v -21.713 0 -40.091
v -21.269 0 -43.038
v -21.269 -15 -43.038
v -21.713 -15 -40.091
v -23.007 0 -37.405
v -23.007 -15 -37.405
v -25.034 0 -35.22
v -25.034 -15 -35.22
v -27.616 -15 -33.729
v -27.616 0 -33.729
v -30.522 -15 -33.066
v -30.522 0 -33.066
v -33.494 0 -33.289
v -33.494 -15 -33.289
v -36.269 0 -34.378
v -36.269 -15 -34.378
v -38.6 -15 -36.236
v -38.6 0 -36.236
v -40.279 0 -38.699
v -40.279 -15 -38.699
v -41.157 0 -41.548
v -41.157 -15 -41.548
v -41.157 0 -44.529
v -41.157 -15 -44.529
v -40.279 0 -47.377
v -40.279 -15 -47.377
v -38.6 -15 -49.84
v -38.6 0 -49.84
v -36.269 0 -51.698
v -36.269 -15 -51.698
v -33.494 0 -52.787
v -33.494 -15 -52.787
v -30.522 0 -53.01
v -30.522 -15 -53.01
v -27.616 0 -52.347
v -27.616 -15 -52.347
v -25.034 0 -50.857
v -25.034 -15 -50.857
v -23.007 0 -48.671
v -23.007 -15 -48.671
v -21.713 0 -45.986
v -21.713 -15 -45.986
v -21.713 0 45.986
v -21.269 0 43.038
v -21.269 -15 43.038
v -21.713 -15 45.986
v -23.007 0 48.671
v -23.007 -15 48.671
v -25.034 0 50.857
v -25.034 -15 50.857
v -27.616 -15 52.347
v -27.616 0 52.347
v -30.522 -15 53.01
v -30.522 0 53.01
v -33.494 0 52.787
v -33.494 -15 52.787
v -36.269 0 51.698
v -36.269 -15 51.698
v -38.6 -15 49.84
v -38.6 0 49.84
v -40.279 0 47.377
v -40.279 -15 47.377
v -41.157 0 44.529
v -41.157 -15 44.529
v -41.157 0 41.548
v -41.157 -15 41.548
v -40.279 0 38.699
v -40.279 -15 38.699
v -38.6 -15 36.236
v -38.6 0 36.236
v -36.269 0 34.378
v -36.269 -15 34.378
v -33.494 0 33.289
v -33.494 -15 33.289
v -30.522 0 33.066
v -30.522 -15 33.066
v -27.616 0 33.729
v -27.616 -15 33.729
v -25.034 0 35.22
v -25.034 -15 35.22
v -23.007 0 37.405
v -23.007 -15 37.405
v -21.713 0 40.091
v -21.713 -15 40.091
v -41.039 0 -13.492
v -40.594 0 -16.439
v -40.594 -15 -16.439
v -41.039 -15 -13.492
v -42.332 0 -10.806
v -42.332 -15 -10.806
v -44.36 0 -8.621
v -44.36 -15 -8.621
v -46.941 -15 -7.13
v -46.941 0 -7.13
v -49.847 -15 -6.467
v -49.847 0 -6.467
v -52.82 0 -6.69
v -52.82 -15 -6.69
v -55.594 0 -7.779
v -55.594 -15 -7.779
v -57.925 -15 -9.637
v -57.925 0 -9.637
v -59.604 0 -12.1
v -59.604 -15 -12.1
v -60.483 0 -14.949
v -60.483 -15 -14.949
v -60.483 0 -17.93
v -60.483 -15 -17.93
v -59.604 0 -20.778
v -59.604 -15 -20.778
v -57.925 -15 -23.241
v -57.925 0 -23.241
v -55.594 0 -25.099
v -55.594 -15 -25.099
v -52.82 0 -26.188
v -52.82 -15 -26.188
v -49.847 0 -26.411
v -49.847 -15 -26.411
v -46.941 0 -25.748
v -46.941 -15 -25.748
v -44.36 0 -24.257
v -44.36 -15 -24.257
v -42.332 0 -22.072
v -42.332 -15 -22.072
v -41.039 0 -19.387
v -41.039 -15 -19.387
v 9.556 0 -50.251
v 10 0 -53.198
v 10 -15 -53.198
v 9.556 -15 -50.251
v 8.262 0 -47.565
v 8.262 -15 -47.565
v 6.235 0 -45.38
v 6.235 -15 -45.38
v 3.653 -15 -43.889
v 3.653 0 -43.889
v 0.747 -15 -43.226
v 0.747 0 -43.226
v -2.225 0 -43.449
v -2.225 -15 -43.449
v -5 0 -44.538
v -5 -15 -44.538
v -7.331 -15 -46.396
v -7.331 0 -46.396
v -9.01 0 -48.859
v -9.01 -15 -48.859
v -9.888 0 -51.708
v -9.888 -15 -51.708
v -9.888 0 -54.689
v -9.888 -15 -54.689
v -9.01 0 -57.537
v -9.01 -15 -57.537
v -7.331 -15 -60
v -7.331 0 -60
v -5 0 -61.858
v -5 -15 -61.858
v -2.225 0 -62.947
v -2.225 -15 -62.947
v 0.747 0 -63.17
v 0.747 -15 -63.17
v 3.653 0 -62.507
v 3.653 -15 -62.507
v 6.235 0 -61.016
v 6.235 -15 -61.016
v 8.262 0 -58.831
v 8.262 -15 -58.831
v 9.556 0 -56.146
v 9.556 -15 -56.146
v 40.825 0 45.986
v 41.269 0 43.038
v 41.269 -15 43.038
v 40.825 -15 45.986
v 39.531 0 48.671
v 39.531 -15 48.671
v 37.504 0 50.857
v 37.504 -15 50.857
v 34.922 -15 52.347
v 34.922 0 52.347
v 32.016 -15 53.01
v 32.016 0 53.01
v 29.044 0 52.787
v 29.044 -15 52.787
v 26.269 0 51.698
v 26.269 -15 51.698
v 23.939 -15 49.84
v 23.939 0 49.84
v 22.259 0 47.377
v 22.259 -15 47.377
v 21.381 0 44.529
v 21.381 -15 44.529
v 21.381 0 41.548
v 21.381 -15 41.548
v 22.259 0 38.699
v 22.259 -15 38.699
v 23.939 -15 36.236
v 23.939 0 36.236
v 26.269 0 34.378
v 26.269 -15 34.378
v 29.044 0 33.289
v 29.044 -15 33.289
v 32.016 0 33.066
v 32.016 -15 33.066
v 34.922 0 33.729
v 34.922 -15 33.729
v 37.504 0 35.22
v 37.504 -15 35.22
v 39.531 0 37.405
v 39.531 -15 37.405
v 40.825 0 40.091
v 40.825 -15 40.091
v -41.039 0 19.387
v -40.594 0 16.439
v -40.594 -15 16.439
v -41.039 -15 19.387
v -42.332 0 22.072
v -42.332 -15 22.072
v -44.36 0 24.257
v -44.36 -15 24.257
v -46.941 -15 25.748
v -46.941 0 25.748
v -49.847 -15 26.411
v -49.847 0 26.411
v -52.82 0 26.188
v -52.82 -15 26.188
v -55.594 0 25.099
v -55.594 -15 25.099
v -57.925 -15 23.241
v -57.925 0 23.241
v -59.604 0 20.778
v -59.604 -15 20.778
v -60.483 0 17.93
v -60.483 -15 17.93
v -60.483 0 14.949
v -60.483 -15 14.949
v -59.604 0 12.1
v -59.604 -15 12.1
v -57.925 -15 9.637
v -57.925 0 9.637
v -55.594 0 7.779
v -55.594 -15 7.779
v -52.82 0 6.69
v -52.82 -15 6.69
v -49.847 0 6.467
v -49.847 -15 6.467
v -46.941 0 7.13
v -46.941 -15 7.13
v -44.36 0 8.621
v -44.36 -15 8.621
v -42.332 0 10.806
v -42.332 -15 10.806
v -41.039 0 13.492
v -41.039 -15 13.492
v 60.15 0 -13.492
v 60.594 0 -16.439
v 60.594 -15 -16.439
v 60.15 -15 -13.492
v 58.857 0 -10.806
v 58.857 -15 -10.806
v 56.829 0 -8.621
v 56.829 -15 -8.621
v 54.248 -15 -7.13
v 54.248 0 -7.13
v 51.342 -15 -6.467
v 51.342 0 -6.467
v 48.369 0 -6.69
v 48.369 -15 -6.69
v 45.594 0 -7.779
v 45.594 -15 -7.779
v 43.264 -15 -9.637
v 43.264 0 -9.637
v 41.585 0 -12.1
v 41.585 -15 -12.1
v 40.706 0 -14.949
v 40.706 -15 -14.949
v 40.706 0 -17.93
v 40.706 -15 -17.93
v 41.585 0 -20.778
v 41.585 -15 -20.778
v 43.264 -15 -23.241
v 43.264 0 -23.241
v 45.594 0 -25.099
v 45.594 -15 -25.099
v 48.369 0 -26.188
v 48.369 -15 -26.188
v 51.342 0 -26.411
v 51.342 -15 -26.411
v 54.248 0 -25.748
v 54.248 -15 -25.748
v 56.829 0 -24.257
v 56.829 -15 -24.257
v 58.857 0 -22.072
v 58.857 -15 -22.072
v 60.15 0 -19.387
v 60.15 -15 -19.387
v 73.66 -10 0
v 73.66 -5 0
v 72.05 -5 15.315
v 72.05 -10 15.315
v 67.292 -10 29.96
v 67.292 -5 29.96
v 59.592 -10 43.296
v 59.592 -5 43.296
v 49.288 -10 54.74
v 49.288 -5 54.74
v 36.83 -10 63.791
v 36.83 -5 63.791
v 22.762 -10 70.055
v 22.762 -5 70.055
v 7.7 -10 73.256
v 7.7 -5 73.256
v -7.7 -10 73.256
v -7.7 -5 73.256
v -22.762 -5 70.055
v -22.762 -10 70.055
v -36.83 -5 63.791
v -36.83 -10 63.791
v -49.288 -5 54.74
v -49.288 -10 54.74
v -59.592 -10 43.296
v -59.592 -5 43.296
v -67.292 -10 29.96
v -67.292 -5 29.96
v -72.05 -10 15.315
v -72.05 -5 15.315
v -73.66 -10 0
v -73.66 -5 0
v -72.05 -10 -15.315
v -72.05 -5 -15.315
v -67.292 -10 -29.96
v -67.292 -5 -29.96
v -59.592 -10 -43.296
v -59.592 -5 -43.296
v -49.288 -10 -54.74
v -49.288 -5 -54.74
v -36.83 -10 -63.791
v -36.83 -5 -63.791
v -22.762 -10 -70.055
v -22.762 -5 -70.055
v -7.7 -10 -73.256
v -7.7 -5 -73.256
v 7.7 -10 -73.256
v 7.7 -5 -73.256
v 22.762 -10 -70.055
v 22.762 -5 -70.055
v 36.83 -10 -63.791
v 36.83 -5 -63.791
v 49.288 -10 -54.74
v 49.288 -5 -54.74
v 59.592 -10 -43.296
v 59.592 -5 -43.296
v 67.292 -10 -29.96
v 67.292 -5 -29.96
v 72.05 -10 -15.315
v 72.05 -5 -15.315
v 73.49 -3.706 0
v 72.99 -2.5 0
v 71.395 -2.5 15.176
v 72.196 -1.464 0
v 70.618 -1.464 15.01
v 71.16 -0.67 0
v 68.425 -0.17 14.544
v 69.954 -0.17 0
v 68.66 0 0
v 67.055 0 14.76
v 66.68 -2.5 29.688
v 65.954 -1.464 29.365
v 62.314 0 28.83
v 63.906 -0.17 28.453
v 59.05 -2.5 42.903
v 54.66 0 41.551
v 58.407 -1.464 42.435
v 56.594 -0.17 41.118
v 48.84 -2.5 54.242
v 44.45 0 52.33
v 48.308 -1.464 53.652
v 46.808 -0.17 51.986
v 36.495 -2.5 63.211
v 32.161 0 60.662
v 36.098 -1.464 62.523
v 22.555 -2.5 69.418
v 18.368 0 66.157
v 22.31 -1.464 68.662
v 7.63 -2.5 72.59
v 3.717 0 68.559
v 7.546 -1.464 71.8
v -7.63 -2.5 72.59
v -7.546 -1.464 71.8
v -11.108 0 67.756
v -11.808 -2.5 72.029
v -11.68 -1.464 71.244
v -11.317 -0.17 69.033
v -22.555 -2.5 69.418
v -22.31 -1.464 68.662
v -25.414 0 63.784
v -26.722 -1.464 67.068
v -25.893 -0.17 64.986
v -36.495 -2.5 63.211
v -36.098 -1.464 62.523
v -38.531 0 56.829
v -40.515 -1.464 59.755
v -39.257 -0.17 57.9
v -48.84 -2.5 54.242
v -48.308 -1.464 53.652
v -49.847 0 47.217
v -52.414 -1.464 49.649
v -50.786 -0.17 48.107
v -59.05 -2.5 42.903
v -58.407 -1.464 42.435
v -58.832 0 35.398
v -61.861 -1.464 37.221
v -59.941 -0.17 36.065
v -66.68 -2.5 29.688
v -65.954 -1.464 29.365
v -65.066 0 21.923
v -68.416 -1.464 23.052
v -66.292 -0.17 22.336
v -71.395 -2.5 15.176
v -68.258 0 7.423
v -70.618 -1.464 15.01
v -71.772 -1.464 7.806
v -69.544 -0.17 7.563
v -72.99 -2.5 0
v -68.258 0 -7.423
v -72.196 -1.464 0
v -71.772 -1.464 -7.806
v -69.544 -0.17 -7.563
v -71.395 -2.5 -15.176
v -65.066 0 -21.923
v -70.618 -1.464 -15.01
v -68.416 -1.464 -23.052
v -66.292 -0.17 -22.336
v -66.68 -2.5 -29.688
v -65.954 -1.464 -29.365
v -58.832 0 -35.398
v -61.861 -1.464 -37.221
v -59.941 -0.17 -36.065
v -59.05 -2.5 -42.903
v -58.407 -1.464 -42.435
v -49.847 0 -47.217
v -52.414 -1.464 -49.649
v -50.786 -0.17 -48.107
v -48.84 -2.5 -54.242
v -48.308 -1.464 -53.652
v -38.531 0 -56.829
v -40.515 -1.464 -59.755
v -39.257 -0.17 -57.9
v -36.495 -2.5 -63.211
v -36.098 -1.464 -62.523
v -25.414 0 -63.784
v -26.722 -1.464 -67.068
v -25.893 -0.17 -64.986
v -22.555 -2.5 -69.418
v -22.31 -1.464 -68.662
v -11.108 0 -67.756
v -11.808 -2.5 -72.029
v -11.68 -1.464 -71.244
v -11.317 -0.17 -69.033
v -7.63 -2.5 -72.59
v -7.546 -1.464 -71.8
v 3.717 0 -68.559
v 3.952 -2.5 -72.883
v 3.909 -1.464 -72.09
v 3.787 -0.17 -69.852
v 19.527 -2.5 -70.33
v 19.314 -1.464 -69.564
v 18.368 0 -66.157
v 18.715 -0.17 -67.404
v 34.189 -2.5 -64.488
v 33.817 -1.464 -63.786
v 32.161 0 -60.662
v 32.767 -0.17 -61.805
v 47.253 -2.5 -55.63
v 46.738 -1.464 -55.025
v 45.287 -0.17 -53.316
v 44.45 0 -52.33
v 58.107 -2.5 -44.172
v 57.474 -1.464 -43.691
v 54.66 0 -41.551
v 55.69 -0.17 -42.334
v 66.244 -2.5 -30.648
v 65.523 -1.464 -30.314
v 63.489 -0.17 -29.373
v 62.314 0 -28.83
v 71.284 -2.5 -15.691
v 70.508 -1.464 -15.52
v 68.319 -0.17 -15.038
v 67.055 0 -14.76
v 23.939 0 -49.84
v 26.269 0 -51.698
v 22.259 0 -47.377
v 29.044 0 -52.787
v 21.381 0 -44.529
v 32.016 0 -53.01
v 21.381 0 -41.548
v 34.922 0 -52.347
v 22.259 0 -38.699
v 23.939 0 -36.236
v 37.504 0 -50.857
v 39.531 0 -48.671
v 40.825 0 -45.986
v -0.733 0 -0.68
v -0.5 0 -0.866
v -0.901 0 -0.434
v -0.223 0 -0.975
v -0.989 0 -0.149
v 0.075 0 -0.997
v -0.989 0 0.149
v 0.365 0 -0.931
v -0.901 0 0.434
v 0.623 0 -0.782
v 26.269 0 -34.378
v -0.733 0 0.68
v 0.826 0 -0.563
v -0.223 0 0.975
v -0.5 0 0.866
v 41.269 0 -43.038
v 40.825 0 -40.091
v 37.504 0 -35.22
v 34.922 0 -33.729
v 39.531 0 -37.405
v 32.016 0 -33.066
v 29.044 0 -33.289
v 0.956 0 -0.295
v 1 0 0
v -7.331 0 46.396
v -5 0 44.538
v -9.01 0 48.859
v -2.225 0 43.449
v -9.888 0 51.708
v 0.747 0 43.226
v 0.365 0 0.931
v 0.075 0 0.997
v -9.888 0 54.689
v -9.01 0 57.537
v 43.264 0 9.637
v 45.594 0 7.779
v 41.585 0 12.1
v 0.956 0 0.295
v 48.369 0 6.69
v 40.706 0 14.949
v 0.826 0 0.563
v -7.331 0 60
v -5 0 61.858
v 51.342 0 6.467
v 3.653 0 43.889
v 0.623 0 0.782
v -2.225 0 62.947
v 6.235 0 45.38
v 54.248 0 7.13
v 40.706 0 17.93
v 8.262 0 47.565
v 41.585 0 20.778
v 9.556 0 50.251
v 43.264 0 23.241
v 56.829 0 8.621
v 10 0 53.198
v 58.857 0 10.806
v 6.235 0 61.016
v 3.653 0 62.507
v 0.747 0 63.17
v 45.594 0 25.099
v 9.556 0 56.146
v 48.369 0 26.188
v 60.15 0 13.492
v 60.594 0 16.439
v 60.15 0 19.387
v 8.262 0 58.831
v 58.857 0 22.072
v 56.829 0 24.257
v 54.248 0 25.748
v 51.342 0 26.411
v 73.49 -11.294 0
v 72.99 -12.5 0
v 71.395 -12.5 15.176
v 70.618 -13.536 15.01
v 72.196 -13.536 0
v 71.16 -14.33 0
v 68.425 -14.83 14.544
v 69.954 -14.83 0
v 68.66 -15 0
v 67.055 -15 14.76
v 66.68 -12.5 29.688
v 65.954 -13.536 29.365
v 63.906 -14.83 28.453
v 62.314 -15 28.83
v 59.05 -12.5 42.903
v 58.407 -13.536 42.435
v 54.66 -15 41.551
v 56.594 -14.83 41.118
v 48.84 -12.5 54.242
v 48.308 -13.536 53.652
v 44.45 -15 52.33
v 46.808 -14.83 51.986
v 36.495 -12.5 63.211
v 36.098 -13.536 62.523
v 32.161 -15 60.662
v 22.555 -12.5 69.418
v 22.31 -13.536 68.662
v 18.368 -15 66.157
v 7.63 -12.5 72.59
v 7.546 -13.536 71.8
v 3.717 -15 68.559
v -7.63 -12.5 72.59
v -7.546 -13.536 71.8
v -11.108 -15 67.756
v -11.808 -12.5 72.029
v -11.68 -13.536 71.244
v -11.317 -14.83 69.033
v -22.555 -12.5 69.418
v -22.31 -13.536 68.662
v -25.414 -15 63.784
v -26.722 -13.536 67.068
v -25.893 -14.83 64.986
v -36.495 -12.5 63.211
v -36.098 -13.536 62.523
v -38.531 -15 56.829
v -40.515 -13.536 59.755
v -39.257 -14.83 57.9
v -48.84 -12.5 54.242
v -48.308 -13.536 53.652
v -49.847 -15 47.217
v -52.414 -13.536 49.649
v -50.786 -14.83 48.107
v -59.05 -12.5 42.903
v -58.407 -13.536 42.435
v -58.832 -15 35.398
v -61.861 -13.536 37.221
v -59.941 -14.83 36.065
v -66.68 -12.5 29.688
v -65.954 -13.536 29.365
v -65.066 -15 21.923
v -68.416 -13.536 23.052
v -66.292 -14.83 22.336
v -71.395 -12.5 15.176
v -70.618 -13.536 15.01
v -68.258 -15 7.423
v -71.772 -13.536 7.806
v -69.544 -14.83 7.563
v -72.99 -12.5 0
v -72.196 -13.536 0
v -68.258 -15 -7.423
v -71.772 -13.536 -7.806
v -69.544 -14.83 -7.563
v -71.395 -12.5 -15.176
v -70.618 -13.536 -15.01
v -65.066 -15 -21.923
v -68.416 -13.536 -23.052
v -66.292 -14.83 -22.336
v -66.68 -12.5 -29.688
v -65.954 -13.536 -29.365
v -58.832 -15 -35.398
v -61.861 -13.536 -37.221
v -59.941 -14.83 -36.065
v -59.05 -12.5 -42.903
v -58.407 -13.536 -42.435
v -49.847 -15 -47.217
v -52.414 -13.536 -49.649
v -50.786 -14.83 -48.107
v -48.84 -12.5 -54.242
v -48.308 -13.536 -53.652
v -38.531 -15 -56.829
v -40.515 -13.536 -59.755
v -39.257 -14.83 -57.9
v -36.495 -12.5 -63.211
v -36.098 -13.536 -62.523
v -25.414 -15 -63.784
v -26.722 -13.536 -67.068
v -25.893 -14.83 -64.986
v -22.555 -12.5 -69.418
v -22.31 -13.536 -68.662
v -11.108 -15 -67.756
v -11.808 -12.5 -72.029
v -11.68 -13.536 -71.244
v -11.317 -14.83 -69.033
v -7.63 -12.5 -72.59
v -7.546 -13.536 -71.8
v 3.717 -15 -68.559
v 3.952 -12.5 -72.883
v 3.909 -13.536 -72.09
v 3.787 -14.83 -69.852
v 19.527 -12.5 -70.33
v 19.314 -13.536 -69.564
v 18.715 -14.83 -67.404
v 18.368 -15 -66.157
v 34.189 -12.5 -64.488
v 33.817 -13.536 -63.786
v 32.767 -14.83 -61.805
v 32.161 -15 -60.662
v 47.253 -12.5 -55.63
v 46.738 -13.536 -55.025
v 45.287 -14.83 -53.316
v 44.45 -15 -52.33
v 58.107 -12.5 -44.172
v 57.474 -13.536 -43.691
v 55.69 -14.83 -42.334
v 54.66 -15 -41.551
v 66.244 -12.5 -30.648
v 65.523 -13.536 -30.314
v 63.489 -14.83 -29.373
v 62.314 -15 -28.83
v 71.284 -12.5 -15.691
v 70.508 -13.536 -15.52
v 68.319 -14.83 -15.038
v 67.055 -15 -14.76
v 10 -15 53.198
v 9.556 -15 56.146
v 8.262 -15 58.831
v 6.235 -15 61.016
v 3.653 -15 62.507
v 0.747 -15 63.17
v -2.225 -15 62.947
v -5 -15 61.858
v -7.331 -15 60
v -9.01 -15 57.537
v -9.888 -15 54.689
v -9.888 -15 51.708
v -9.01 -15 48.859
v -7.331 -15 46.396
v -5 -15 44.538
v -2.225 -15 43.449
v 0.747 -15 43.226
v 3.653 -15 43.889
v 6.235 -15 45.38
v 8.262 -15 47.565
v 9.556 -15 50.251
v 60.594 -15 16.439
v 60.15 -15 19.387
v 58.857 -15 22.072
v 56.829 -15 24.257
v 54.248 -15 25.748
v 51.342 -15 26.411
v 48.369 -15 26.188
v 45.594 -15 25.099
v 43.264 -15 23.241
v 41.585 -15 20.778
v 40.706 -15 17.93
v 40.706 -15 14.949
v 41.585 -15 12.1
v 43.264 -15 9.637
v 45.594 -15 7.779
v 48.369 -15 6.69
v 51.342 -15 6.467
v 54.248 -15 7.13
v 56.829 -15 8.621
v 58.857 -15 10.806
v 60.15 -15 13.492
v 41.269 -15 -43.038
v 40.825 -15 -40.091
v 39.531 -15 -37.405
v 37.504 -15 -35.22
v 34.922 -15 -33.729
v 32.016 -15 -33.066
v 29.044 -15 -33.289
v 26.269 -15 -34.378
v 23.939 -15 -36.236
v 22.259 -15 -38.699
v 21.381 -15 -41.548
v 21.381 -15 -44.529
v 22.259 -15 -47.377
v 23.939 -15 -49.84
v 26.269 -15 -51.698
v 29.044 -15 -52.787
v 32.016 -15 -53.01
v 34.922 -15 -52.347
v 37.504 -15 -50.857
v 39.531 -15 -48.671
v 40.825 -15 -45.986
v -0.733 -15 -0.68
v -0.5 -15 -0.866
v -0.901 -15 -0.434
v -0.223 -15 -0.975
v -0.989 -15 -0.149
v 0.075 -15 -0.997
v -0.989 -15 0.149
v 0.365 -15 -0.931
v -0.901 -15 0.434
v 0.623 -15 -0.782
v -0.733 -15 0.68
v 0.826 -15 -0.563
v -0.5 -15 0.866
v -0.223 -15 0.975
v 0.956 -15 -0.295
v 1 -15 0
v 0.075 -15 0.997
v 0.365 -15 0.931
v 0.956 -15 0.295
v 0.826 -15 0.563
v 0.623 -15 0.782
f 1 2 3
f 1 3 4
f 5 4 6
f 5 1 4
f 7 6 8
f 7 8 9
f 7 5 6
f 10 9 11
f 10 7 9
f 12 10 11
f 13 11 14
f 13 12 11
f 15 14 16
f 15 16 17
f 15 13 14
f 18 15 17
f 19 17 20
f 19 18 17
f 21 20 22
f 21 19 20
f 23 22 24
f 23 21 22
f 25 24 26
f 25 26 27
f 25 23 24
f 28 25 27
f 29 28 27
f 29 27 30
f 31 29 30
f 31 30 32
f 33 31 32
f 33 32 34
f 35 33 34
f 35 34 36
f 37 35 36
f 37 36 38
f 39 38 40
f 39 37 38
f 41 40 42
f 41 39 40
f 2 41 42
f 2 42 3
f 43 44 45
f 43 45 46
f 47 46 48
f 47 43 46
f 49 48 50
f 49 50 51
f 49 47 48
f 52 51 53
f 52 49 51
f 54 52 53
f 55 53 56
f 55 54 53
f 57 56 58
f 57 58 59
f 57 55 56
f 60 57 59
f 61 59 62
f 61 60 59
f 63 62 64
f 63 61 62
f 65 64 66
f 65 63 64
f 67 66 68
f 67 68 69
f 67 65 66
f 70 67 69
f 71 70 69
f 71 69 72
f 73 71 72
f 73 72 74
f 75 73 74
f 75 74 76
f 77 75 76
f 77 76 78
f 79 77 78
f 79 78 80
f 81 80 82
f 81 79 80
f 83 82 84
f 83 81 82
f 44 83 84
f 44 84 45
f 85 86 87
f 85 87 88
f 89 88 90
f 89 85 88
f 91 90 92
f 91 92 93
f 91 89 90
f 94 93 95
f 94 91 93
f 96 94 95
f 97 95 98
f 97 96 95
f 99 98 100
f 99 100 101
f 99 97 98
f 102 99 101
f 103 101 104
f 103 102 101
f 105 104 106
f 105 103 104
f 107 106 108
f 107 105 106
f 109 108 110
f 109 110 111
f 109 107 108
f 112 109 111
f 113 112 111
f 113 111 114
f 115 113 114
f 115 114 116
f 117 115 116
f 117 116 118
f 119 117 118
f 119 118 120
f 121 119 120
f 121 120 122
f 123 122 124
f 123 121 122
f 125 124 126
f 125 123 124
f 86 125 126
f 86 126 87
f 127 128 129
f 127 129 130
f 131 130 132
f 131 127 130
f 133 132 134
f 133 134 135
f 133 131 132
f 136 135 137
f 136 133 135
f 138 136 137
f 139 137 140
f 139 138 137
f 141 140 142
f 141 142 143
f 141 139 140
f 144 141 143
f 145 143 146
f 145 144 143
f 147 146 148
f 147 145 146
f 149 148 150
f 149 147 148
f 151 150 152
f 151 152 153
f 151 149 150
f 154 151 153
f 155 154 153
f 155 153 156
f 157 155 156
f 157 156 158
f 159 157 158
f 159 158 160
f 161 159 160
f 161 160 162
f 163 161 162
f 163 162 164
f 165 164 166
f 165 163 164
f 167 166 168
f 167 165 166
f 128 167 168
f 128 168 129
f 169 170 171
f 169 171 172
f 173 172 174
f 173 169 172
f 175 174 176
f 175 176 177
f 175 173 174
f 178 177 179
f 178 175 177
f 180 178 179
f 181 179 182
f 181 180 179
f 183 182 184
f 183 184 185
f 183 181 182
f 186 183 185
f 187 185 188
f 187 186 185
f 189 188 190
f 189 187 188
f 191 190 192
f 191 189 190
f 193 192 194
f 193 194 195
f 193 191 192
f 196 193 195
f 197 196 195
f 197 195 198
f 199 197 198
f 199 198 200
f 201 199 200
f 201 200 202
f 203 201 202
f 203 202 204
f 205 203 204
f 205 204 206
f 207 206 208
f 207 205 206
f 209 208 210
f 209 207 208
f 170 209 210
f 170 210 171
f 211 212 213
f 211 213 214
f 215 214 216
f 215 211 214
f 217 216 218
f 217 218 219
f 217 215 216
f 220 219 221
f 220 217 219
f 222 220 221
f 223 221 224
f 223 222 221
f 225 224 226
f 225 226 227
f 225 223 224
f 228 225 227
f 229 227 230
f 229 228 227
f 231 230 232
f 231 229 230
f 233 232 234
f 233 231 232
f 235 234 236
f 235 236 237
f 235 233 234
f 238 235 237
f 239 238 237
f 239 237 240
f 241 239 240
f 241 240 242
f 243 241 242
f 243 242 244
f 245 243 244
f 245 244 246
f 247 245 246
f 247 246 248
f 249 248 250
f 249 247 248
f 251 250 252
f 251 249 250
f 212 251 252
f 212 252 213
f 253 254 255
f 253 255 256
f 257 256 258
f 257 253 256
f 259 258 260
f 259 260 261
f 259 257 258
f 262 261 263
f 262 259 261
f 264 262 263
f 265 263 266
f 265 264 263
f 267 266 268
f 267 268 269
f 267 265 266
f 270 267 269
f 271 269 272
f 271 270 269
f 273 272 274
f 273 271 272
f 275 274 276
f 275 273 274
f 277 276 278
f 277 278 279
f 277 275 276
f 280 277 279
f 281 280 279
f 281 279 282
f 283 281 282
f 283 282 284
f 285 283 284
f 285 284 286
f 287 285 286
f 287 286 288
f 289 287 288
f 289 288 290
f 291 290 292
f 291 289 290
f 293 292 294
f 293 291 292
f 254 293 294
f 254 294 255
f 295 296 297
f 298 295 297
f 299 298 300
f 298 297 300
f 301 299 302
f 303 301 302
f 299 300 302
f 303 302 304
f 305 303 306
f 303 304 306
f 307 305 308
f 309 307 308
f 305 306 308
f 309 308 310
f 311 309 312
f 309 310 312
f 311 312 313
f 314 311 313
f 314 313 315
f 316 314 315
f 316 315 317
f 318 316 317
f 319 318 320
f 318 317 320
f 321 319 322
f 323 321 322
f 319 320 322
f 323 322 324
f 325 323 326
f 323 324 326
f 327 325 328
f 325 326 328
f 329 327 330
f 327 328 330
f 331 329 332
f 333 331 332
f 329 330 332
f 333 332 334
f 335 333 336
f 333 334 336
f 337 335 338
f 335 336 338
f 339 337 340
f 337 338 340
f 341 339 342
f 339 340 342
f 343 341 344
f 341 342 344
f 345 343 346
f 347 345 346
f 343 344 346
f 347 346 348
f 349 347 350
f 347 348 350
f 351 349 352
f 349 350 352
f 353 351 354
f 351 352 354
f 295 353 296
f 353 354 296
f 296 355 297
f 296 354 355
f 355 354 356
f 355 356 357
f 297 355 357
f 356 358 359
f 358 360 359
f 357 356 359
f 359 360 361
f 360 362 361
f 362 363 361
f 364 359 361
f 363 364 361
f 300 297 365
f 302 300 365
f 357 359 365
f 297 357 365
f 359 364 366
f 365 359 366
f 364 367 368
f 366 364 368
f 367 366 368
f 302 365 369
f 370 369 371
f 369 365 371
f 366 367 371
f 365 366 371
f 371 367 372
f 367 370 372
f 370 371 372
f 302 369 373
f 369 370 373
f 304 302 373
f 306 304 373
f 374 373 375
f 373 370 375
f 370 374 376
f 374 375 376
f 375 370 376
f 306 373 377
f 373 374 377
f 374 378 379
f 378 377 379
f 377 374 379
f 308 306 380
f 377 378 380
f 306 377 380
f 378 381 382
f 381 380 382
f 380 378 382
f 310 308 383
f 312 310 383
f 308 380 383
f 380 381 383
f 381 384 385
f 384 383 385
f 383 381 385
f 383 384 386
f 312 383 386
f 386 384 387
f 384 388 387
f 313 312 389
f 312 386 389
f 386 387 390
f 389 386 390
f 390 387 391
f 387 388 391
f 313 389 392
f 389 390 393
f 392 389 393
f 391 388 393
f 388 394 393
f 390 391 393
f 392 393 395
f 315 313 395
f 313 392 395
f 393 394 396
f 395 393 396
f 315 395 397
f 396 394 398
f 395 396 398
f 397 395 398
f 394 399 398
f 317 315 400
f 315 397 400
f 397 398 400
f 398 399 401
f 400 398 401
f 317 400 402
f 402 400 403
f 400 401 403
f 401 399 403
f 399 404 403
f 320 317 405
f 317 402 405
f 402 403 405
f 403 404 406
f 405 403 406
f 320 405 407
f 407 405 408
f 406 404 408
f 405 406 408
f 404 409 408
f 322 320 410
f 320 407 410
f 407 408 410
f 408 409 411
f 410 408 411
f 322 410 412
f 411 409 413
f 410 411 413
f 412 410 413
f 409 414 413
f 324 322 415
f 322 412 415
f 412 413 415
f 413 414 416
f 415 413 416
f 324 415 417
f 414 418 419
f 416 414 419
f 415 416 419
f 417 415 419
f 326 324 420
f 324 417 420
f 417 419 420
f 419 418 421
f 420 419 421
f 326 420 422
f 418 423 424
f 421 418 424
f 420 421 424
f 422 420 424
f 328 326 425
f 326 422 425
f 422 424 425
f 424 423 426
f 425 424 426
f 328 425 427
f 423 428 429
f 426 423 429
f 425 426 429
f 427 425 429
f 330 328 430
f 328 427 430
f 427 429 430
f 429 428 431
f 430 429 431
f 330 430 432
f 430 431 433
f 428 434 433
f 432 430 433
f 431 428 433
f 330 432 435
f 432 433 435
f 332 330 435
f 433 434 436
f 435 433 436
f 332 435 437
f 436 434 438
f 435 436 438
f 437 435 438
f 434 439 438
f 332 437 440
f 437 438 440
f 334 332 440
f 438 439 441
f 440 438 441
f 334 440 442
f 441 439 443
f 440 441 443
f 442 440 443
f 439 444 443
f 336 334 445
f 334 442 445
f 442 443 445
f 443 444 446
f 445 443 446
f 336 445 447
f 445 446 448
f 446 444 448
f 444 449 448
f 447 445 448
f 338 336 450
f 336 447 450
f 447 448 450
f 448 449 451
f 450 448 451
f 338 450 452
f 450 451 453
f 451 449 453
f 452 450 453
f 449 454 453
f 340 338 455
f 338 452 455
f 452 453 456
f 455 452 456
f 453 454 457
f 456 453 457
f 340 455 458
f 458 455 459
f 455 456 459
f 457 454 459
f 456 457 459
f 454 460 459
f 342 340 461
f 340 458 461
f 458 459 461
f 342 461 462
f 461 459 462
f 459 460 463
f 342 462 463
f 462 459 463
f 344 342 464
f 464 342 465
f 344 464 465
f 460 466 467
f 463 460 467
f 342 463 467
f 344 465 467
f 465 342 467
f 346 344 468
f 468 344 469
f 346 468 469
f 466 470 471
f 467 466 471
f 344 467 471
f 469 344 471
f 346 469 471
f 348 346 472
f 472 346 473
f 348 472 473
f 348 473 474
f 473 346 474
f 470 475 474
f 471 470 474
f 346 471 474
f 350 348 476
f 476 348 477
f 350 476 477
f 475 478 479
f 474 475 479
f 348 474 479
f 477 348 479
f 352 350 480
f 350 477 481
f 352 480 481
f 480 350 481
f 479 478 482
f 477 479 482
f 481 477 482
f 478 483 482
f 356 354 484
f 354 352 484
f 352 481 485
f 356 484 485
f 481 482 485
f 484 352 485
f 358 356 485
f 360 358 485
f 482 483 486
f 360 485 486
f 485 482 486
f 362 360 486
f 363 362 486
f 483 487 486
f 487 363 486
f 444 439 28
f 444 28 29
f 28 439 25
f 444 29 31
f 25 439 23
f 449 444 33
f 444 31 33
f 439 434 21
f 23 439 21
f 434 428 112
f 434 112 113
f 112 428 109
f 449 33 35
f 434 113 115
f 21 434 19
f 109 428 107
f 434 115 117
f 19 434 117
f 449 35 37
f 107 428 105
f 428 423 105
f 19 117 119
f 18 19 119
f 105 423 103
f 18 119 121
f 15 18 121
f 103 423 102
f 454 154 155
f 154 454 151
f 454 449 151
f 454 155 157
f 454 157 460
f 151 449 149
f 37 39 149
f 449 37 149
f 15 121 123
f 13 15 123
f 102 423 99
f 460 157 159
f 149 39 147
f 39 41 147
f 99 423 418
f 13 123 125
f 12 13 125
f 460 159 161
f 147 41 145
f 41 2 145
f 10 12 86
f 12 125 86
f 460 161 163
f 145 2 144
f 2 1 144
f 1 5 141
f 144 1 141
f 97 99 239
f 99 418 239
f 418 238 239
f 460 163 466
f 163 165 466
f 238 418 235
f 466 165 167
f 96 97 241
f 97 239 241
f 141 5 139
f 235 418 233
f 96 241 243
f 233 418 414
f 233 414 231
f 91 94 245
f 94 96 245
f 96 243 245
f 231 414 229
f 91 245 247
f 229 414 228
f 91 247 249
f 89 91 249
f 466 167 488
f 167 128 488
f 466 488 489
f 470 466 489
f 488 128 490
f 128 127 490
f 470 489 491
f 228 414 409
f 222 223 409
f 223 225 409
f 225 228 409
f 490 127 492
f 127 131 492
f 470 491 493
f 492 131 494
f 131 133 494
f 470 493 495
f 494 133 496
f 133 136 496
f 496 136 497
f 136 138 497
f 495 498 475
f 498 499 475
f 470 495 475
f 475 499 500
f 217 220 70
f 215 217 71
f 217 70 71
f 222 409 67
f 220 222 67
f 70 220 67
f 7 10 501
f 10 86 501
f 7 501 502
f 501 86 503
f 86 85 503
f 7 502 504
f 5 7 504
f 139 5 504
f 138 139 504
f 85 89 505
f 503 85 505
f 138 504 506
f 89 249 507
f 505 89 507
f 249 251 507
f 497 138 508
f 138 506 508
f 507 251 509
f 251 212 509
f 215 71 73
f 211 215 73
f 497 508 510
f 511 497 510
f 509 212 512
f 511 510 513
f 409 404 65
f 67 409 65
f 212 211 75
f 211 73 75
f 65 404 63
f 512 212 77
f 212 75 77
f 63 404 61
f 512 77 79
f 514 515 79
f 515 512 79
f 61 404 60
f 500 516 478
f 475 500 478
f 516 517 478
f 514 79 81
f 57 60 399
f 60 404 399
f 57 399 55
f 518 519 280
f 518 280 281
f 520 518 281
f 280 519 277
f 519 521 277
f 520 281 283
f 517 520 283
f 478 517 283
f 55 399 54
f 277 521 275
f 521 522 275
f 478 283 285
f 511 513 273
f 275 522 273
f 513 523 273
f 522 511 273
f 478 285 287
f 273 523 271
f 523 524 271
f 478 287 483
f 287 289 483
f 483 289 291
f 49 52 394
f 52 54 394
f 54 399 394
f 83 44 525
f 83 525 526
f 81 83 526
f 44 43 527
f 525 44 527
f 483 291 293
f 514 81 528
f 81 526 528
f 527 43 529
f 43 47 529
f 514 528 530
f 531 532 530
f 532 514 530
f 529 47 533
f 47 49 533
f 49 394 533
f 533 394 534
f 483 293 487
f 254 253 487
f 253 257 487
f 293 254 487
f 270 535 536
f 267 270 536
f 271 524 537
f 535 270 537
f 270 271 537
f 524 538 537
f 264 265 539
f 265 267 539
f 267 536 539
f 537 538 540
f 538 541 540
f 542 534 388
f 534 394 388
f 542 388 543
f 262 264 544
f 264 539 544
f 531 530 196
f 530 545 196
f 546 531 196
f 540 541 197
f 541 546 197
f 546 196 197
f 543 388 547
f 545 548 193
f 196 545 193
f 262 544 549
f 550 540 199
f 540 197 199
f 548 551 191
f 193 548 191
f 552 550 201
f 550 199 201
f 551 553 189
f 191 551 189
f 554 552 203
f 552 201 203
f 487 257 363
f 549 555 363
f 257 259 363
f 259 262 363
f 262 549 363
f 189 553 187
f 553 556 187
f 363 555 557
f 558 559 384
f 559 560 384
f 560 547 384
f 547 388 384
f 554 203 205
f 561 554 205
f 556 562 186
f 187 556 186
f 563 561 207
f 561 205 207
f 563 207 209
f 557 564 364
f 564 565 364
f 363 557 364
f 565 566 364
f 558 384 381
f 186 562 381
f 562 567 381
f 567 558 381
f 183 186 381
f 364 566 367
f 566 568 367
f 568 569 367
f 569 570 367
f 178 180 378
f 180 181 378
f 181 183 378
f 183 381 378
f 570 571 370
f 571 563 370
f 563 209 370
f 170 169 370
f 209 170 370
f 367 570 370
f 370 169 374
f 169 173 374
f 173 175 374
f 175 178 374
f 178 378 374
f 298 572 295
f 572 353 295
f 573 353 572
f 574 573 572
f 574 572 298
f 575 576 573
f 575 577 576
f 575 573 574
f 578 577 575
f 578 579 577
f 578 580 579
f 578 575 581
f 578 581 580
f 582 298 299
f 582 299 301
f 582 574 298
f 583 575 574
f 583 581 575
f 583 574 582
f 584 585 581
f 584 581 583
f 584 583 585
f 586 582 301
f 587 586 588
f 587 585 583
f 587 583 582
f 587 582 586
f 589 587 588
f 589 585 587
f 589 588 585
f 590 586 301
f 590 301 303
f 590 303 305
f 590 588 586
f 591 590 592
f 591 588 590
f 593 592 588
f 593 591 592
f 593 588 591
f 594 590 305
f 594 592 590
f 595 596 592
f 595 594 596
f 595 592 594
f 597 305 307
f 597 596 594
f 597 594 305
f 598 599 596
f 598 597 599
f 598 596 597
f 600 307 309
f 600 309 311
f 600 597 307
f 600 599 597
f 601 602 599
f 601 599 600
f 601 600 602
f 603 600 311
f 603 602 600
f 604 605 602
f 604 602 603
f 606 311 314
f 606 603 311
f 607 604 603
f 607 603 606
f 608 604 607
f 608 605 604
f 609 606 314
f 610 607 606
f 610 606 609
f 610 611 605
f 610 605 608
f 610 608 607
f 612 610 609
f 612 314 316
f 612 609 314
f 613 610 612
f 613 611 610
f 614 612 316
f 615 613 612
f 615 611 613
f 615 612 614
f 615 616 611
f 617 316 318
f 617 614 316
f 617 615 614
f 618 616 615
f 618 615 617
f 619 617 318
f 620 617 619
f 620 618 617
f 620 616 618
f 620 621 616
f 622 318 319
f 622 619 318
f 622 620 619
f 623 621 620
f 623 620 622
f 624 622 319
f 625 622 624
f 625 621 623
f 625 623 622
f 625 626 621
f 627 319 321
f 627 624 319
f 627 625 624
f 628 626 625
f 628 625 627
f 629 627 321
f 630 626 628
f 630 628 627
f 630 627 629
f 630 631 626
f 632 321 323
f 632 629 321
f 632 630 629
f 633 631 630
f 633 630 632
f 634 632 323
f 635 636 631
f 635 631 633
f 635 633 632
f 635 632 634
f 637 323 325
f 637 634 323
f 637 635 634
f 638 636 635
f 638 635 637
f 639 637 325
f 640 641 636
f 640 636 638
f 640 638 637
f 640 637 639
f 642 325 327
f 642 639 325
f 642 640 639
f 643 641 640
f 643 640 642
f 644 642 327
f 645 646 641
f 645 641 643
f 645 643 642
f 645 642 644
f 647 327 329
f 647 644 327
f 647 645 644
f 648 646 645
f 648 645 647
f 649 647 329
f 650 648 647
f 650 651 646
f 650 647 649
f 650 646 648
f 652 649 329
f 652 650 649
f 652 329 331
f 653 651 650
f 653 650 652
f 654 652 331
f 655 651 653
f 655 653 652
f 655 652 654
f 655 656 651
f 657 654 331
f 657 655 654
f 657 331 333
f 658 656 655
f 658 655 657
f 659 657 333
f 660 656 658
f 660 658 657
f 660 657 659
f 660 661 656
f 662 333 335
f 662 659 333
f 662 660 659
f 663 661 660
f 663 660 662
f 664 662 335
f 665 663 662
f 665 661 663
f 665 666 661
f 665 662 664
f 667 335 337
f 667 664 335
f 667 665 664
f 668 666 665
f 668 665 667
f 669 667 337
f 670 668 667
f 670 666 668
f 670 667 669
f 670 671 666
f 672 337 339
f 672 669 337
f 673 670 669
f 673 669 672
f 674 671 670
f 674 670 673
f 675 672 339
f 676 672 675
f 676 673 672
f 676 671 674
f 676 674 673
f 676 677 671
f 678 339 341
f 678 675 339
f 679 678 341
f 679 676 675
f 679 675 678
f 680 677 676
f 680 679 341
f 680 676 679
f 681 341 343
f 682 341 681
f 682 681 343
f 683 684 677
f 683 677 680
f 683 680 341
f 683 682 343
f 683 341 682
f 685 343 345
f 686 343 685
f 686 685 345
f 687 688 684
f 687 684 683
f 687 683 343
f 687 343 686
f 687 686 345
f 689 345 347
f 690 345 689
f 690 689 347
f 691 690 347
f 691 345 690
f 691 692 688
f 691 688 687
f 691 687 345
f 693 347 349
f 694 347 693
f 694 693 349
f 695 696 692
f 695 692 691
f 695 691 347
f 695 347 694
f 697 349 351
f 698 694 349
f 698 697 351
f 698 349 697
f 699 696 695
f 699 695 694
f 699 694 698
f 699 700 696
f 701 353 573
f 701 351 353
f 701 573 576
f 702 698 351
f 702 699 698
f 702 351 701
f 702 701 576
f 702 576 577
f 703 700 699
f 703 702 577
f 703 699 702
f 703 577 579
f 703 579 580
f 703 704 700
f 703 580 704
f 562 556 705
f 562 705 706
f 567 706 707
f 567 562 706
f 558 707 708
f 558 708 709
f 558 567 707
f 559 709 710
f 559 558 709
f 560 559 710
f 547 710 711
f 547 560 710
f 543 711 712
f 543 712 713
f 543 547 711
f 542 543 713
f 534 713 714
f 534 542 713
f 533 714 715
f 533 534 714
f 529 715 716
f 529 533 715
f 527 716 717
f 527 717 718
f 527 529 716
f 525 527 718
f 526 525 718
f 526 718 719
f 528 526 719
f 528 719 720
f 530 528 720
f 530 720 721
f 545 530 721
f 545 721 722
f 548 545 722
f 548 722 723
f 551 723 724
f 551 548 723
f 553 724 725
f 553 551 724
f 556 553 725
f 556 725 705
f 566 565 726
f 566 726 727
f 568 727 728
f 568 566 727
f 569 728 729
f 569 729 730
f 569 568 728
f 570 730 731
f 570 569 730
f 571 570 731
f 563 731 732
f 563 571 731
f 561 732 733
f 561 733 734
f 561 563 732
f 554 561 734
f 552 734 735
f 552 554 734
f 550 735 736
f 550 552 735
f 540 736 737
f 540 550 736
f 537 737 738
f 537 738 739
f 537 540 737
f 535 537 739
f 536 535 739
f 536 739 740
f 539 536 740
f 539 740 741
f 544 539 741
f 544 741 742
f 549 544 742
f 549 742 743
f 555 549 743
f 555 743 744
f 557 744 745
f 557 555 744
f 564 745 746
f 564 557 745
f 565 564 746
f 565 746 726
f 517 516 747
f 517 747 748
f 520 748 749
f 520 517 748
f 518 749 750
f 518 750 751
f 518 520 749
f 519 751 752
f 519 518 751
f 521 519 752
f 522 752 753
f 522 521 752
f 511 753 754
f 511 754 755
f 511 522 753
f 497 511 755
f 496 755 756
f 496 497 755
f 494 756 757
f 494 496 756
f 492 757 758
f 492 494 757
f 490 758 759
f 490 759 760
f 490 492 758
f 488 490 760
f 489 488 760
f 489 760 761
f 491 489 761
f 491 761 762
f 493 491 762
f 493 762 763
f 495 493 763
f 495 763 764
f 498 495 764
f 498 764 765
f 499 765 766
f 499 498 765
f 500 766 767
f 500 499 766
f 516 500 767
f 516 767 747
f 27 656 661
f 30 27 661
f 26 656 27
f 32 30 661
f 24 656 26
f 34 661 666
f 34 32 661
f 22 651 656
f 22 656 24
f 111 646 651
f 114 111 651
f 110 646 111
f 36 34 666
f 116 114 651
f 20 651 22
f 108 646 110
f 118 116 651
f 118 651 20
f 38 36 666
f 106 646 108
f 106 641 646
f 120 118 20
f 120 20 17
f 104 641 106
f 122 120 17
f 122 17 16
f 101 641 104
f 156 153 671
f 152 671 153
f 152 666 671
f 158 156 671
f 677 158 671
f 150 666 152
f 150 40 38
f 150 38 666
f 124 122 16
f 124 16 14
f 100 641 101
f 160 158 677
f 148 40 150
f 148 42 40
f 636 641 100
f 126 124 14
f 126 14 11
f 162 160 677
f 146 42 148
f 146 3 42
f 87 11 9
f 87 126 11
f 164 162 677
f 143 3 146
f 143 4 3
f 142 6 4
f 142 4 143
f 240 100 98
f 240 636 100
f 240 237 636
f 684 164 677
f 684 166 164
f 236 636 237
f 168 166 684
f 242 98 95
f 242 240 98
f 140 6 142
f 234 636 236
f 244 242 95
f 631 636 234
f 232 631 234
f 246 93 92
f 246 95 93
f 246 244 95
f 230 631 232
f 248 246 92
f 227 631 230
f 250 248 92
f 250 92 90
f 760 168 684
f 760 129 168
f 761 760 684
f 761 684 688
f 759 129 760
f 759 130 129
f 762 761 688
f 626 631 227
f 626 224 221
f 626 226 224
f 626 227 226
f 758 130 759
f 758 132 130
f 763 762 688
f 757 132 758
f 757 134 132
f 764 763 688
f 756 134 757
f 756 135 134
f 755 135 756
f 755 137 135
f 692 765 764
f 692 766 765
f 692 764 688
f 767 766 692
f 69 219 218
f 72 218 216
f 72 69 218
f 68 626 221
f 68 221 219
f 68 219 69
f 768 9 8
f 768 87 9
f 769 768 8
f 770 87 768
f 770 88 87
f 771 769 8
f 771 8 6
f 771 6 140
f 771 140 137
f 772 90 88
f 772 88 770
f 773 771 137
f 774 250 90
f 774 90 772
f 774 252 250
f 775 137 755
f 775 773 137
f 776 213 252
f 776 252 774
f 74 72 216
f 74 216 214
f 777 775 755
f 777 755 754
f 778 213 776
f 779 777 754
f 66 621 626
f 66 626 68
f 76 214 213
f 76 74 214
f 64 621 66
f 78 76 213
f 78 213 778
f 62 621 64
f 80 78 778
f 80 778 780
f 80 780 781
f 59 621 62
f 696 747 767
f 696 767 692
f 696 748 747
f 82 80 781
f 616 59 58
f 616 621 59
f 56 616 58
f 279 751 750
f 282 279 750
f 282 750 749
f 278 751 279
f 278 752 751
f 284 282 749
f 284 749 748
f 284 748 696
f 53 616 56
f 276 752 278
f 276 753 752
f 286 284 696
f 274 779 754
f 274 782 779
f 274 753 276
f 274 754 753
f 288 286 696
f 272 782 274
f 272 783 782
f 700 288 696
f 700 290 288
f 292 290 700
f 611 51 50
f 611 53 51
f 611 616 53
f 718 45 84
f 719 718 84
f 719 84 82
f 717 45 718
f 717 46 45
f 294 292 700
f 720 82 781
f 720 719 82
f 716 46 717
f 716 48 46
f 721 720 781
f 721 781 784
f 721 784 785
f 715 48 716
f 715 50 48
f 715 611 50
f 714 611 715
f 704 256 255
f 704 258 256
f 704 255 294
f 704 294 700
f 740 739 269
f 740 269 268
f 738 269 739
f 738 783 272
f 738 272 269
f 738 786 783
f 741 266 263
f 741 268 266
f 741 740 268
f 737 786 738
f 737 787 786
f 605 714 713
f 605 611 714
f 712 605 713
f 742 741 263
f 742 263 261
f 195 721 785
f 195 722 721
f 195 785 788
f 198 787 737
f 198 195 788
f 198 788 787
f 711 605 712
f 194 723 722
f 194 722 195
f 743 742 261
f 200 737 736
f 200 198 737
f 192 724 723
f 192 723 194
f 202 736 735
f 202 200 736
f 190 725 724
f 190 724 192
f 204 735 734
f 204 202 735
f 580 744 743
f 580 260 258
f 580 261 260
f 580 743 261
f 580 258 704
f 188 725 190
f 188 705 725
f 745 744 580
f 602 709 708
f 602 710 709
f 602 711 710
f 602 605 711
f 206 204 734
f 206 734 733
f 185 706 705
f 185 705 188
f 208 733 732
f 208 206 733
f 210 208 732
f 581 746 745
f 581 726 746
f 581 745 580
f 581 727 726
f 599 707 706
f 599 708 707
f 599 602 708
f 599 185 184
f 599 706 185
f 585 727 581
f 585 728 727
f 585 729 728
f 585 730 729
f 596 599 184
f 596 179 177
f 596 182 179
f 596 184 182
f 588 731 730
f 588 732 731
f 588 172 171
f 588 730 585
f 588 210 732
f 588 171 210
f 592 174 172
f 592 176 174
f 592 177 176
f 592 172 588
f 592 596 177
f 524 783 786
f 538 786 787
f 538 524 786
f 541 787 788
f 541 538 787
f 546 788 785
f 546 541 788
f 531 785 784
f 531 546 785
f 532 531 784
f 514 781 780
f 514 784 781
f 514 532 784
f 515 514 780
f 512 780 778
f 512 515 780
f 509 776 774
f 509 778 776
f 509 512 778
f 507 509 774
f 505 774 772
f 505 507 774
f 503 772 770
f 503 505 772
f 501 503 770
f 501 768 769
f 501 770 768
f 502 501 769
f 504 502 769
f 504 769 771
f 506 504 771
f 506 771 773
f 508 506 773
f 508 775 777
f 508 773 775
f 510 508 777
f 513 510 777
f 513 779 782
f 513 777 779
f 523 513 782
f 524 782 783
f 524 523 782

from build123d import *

# Parameters (mm, degrees)
F0_R     = 73.66
F0_R_2   = 10
F1_DEPTH = 15
F2_R     = 1
F3_DEPTH = 25
F4_R     = 5


with BuildPart() as f1:
    # F0 (on Front) → F1 (new body)
    with BuildSketch(Plane.XZ):
        Circle(F0_R)
        with Locations((-31.269082, -43.038199)):
            Circle(F0_R_2, mode=Mode.SUBTRACT)
        with Locations((0, -53.19814)):
            Circle(F0_R_2, mode=Mode.SUBTRACT)
        with Locations((-50.594438, -16.439129)):
            Circle(F0_R_2, mode=Mode.SUBTRACT)
        with Locations((31.269082, -43.038199)):
            Circle(F0_R_2, mode=Mode.SUBTRACT)
        with Locations((50.594438, -16.439129)):
            Circle(F0_R_2, mode=Mode.SUBTRACT)
        with Locations((-50.594438, 16.439129)):
            Circle(F0_R_2, mode=Mode.SUBTRACT)
        with Locations((-31.269082, 43.038199)):
            Circle(F0_R_2, mode=Mode.SUBTRACT)
        with Locations((0, 53.19814)):
            Circle(F0_R_2, mode=Mode.SUBTRACT)
        with Locations((50.594438, 16.439129)):
            Circle(F0_R_2, mode=Mode.SUBTRACT)
        with Locations((31.269082, 43.038199)):
            Circle(F0_R_2, mode=Mode.SUBTRACT)
    extrude(amount=F1_DEPTH)

    # F2 (on Front) → F3 (cut)
    with BuildSketch(Plane.XZ):
        Circle(F2_R)
    extrude(amount=F3_DEPTH, mode=Mode.SUBTRACT)

    # F4
    f4_edges = [f1.edges().sort_by_distance(p)[0] for p in [
        (-73.66, -15, 0),
        (-73.66, 0, 0),
    ]]
    fillet(f4_edges, radius=F4_R)


solid = f1.part
